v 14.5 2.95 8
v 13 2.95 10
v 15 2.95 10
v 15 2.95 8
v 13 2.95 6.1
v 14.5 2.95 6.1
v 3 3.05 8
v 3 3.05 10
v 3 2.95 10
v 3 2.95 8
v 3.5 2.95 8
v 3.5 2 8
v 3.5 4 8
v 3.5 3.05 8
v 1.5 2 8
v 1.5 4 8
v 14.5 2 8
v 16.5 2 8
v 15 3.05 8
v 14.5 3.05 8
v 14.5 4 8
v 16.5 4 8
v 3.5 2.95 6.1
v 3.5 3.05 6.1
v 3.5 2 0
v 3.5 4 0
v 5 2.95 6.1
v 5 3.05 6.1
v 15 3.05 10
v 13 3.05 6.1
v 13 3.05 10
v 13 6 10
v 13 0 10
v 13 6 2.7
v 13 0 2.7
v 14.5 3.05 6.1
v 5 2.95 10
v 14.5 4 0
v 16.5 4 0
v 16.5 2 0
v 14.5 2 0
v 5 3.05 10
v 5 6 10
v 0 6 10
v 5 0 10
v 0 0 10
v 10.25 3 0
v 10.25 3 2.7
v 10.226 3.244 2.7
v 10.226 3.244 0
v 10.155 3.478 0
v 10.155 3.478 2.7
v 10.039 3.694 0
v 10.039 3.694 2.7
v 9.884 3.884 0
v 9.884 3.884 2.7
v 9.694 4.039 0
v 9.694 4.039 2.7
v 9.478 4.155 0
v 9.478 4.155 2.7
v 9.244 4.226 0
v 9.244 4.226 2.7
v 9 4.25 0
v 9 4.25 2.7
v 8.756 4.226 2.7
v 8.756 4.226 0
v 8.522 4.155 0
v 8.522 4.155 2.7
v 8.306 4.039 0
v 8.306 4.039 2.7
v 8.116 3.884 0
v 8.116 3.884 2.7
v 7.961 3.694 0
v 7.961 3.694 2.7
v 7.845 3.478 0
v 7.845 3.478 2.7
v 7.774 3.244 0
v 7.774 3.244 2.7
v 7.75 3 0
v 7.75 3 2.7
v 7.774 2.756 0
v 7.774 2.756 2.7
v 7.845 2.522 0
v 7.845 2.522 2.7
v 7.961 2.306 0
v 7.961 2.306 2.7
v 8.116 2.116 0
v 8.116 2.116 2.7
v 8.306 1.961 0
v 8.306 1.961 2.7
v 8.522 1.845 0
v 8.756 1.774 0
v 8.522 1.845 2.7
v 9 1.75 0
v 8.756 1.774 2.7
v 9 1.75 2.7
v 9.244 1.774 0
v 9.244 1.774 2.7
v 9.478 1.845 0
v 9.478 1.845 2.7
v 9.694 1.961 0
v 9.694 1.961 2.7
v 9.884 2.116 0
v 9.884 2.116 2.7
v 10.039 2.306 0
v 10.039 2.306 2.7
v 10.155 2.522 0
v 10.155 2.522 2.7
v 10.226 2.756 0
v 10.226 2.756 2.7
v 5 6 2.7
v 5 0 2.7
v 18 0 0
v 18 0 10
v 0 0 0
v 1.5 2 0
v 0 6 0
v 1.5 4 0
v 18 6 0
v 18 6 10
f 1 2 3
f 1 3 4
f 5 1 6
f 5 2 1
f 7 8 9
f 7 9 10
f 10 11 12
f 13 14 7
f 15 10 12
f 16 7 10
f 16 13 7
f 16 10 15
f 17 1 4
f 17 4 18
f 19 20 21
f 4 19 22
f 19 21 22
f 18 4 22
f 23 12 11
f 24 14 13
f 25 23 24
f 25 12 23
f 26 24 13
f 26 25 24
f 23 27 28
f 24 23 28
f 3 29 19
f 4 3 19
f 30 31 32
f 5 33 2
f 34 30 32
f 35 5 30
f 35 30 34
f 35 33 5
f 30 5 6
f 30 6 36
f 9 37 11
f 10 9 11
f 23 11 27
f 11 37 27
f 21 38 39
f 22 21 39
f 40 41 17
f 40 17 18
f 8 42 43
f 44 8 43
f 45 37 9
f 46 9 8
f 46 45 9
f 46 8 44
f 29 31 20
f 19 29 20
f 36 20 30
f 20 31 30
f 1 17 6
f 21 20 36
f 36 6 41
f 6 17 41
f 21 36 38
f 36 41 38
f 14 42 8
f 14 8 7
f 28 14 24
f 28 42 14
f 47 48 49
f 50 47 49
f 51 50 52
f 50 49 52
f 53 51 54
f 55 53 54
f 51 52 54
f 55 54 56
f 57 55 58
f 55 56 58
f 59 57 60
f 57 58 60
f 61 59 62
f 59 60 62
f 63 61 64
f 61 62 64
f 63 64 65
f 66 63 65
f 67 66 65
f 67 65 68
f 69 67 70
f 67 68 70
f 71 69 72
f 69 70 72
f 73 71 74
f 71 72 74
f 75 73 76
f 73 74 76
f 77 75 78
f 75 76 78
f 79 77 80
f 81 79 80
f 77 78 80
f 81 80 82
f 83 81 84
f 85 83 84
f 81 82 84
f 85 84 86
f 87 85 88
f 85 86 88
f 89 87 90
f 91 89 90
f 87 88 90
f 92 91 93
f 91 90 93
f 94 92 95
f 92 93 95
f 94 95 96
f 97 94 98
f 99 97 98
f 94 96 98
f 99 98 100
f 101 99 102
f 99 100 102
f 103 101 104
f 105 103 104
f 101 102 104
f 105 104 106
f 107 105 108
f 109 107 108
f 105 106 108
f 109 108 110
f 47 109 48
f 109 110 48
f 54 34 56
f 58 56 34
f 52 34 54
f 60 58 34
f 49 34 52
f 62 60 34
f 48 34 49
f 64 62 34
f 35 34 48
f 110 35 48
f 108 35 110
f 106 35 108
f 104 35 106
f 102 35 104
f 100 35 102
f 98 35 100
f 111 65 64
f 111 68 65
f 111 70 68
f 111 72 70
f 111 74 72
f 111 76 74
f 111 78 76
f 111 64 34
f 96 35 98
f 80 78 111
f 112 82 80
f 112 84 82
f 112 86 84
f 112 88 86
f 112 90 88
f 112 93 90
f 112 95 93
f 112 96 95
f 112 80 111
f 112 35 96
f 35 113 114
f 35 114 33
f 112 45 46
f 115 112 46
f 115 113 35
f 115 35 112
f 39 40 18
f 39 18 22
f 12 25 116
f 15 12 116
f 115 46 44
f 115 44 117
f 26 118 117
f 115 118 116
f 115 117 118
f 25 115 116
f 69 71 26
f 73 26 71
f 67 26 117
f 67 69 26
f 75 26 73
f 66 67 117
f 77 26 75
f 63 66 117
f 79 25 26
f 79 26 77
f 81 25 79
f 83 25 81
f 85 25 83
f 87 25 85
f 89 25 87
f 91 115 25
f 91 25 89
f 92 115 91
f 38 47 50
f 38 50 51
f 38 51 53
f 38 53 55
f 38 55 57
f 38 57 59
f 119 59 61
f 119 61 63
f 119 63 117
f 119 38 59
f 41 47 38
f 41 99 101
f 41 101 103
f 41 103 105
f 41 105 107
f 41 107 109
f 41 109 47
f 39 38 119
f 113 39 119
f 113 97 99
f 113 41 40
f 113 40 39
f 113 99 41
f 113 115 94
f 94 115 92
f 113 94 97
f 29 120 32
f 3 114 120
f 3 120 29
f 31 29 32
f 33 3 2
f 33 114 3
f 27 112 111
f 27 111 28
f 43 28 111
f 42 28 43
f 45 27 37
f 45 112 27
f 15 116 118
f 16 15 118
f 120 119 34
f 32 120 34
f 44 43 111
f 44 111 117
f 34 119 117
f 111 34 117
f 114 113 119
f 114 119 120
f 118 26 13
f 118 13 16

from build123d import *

# Parameters (mm, degrees)
BOSS_EXTRUDE1_DEPTH = 6
SKETCH3_R           = 1.25
CUT_EXTRUDE1_DEPTH  = 2.7
SKETCH4_W           = 3.9
SKETCH4_H           = 0.1
CUT_EXTRUDE2_DEPTH  = 2
SKETCH5_W           = 2
SKETCH5_H           = 2
CUT_EXTRUDE3_DEPTH  = 8


with BuildPart() as part:
    # Sketch2 → Boss-Extrude1 (new body)
    with BuildSketch(Plane(origin=(0, 0, 0), x_dir=(1, 0, 0), z_dir=(0, 1, 0))):
        Polygon((0, 0), (18, 0), (18, -10), (13, -10), (13, -2.7), (5, -2.7), (5, -10), (0, -10), align=None)
    extrude(amount=BOSS_EXTRUDE1_DEPTH)

    # Sketch3 → Cut-Extrude1 (cut)
    with BuildSketch(Plane.XY.offset(2.7)):
        with Locations((9, 3)):
            Circle(SKETCH3_R)
    extrude(amount=-CUT_EXTRUDE1_DEPTH, mode=Mode.SUBTRACT)

    # Sketch4 → Cut-Extrude2 (cut)
    with BuildSketch(Plane(origin=(5, 0, 0), x_dir=(0, 0, -1), z_dir=(1, 0, 0))):
        with Locations((-8.05, 3)):
            Rectangle(SKETCH4_W, SKETCH4_H)
    cut_extrude2 = extrude(amount=-CUT_EXTRUDE2_DEPTH, mode=Mode.SUBTRACT)

    # Mirror1: Cut-Extrude2 across plane
    add(cut_extrude2.mirror(Plane(origin=(9, 0, 0), x_dir=(0, 0, 1), z_dir=(1, 0, 0))), mode=Mode.SUBTRACT)

    # Sketch5 → Cut-Extrude3 (cut)
    with BuildSketch(Plane(origin=(0, 0, 0), x_dir=(-1, 0, 0), z_dir=(0, 0, -1))):
        with Locations((-2.5, 3)):
            Rectangle(SKETCH5_W, SKETCH5_H)
    cut_extrude3 = extrude(amount=-CUT_EXTRUDE3_DEPTH, mode=Mode.SUBTRACT)

    # Mirror2: Cut-Extrude3 across plane
    add(cut_extrude3.mirror(Plane(origin=(9, 0, 0), x_dir=(0, 0, 1), z_dir=(1, 0, 0))), mode=Mode.SUBTRACT)


solid = part.part
